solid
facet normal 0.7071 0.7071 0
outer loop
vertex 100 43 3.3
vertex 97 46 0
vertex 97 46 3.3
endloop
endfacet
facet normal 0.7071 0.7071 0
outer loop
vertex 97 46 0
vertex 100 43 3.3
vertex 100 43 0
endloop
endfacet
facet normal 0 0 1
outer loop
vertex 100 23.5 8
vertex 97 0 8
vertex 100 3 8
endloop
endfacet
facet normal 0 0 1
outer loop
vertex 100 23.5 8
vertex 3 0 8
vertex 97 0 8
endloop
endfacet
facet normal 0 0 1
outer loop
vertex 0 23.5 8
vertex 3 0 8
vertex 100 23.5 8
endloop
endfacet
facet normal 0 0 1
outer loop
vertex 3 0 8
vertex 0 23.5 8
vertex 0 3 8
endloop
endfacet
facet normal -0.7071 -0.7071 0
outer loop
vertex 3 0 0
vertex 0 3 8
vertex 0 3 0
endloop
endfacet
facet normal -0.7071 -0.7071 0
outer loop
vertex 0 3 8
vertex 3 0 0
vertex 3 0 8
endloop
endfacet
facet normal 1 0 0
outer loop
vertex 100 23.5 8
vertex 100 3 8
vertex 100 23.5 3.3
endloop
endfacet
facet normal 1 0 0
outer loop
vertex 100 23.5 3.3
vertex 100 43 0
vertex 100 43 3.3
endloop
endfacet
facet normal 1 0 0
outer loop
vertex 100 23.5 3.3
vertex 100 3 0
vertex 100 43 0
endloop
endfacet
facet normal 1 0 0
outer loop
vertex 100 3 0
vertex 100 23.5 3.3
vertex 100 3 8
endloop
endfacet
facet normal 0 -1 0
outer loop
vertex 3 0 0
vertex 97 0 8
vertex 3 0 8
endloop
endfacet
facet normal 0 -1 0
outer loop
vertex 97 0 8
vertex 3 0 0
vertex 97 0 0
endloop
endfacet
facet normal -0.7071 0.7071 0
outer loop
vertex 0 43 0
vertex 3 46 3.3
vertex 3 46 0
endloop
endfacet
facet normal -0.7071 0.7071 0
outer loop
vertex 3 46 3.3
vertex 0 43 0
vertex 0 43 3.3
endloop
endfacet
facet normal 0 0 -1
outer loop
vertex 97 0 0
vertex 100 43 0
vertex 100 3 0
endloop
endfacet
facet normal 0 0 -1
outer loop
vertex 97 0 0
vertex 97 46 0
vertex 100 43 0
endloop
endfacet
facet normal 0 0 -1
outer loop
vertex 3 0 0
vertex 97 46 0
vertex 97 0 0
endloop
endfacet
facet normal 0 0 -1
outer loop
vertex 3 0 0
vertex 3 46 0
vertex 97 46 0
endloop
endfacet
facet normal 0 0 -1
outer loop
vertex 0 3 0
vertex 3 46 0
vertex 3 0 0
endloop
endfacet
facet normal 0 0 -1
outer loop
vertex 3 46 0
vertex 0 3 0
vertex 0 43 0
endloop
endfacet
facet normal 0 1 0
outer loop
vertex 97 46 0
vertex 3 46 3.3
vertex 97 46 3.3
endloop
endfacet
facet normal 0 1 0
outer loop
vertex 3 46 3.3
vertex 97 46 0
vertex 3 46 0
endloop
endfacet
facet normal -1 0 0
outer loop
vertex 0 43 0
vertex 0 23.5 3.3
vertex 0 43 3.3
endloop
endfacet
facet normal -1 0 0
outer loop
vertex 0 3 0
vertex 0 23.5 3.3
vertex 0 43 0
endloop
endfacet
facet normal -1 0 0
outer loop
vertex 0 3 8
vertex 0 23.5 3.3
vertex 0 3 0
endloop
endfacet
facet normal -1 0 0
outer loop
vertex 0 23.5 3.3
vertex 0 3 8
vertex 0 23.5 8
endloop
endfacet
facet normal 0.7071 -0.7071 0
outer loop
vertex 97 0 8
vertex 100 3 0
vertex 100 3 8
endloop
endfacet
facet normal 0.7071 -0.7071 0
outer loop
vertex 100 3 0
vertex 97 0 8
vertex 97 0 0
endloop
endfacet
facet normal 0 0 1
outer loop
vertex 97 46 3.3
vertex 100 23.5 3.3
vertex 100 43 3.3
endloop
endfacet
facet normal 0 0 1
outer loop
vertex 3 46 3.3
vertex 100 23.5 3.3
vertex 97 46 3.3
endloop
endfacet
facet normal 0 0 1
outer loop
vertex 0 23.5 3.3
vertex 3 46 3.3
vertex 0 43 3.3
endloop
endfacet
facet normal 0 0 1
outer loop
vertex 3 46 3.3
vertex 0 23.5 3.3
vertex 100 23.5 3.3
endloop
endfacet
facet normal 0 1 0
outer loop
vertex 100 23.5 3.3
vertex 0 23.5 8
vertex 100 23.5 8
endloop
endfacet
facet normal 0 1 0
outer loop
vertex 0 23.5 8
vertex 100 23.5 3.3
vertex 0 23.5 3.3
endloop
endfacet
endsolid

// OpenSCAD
$fn = 32;

// ----------------------------------------------------------------------
// Stepped bar: sidestep, 100 x 46 x 8/3.3 mm
// ----------------------------------------------------------------------

// --- parameters (mm) ---
bar_l = 100;              // bar length, X
bar_w = 46;               // bar width, Y
plate_t = 8;              // thickness of the thick zone, Z
thin_t = 3.3;             // thickness of the thin zone
corner_c = 3;             // corner chamfer of the bar
step_cut = 4.7;           // material removed from the thin zone
ledge_y = 23.5;           // start of the ledge from the front edge
depth_1 = 4.7;            // depth of cut 1 from the top face

profile = [[3, 0], [97, 0], [100, 3], [100, 43], [97, 46], [3, 46], [0, 43], [0, 3]];  // primary outline, 8 points, counter clockwise
void_1 = [[-1, 23.5], [101, 23.5], [101, 47], [-1, 47]];  // ledge cut along one edge, 4 points

// --- the one profile operation ---
difference() {
  linear_extrude(height = plate_t) polygon(points = profile);
  translate([0, 0, plate_t - depth_1])
    linear_extrude(height = depth_1 + 1) polygon(points = void_1);
}
